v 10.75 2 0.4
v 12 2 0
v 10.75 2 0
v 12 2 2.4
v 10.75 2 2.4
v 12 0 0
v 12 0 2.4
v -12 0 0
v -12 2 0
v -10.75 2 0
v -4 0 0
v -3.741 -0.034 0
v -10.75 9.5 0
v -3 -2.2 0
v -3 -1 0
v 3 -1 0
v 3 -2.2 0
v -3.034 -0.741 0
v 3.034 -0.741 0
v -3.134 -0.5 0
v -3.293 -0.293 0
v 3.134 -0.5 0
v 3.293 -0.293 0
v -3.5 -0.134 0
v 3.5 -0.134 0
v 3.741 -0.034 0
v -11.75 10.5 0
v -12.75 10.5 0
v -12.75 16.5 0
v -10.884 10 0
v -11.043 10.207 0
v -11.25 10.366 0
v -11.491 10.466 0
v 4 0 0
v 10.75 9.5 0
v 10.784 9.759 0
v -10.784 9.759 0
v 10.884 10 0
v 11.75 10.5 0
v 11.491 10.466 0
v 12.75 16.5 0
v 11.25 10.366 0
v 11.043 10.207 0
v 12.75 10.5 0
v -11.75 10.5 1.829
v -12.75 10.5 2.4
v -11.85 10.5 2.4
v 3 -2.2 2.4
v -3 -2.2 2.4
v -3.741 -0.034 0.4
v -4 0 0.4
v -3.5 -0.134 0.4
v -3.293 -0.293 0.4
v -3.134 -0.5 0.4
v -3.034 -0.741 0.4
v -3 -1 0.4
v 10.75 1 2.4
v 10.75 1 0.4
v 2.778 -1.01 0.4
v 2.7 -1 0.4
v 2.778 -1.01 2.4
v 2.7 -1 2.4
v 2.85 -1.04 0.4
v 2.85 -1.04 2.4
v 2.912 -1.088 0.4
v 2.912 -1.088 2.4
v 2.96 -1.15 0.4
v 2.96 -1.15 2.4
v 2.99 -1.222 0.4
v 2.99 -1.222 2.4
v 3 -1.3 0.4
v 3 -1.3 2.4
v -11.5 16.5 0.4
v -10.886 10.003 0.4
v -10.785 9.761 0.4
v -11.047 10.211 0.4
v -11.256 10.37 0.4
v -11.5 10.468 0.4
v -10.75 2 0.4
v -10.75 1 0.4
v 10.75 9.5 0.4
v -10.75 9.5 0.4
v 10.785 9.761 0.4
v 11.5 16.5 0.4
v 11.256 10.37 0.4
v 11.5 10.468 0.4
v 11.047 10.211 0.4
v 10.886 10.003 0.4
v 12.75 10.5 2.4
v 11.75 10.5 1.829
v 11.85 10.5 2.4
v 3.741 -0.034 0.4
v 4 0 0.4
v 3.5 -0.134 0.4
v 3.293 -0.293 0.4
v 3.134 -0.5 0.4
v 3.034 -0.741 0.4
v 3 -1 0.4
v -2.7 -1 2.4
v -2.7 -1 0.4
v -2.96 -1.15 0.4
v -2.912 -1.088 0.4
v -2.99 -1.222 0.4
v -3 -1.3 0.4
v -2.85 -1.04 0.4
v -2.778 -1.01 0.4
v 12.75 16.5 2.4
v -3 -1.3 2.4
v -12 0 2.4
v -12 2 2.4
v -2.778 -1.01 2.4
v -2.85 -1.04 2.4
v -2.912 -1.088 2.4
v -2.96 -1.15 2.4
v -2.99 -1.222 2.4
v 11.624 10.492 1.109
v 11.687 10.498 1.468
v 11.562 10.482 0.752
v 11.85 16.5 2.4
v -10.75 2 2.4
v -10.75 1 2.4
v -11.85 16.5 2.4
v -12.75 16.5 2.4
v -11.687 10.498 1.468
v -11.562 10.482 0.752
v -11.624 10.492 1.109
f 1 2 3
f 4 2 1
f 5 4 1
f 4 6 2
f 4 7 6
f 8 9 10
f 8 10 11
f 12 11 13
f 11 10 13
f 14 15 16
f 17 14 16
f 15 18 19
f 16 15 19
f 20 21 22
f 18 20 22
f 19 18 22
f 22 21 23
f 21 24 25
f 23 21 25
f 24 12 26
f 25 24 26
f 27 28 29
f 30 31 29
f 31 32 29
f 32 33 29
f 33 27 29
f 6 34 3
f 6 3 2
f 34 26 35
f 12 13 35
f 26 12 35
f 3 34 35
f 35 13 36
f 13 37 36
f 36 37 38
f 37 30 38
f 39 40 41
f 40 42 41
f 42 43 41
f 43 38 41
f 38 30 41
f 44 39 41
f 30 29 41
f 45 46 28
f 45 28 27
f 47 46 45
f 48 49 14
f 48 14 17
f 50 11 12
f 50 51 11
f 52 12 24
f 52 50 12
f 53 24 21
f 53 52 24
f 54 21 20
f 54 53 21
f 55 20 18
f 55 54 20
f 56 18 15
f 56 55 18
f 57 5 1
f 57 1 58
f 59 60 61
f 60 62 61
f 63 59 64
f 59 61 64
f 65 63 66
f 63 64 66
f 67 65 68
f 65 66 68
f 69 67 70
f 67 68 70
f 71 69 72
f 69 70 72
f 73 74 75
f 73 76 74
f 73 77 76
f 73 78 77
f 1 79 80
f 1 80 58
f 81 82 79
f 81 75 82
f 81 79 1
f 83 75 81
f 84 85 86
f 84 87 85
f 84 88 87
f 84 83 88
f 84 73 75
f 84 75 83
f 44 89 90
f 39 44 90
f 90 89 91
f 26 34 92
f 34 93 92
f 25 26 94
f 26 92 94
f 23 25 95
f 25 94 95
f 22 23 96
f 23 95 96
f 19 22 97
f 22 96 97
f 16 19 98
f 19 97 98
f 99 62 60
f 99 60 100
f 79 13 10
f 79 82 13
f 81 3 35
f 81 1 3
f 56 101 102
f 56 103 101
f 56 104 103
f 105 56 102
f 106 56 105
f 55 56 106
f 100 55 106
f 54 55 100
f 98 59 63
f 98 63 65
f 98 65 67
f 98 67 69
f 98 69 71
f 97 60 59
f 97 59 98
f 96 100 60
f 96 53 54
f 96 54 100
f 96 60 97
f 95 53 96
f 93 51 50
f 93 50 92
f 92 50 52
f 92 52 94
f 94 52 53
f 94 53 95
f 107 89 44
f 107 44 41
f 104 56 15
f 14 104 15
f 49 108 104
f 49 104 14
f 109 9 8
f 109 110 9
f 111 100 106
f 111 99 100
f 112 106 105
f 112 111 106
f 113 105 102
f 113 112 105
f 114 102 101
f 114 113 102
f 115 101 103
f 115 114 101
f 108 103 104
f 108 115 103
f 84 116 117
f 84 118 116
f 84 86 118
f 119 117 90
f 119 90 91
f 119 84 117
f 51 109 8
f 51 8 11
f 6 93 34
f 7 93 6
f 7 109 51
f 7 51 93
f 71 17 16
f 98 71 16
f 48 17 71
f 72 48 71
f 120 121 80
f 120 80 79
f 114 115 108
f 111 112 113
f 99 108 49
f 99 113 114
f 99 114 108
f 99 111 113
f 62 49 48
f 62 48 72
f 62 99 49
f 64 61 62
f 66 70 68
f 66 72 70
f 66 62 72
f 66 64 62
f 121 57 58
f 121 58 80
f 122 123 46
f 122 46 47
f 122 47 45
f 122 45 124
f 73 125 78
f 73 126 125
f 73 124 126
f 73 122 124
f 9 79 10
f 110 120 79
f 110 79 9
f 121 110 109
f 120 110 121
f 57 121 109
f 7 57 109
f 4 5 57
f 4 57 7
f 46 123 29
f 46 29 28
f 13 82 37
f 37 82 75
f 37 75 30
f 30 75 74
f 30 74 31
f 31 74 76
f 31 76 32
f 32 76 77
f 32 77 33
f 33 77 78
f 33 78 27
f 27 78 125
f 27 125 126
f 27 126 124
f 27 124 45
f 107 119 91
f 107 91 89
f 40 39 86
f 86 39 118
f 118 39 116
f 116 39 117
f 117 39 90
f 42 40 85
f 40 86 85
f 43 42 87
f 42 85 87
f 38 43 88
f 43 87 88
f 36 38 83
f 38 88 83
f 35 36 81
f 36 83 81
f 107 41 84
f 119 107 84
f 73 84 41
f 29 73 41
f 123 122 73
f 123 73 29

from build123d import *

# Parameters (mm, degrees)
F0_W     = 6
F0_H     = 1
F0_H_2   = 1.2
F0_W_2   = 1.1
F0_H_3   = 6
F0_W_3   = 0.9
F5_DEPTH = 6
F6_R     = 1
F7_R     = 0.3


with BuildPart() as f2:
    # F2: sweep along a path in F1
    with BuildLine(Plane.XZ) as f2_path:
        Line((0, 0), (0, 0.4))
    # F0 (on Top) → F2 (sweep)
    with BuildSketch(Plane.XY):
        Polygon((-10.75, 1), (-10.75, 0), (-3, 0), (3, 0), (10.75, 0), (10.75, 1), align=None)
        Polygon((-12, 0), (-10.75, 0), (-10.75, 1), (-10.75, 2), (-12, 2), align=None)
        with Locations((0, -0.5)):
            Rectangle(F0_W, F0_H)
        Polygon((-10.75, 2), (-10.75, 1), (10.75, 1), (10.75, 2), (10.75, 10.5), (10.75, 16.5), (-10.75, 16.5), (-10.75, 10.5), align=None)
        with Locations((0, -1.6)):
            Rectangle(F0_W, F0_H_2)
        Polygon((10.75, 2), (10.75, 1), (10.75, 0), (12, 0), (12, 2), align=None)
        with Locations((-11.3, 13.5)):
            Rectangle(F0_W_2, F0_H_3)
        with Locations((-12.3, 13.5)):
            Rectangle(F0_W_3, F0_H_3)
        with Locations((11.3, 13.5)):
            Rectangle(F0_W_2, F0_H_3)
        with Locations((12.3, 13.5)):
            Rectangle(F0_W_3, F0_H_3)
    sweep(path=f2_path.line)

    # F3: sweep along a path in F1
    with BuildLine(Plane.XZ) as f3_path:
        Line((0, 0), (0, 0.4))
        Line((0, 0.4), (0, 2.4))
    # F0 (on Top) → F3 (sweep)
    with BuildSketch(Plane.XY):
        Polygon((-10.75, 1), (-10.75, 0), (-3, 0), (3, 0), (10.75, 0), (10.75, 1), align=None)
        Polygon((-12, 0), (-10.75, 0), (-10.75, 1), (-10.75, 2), (-12, 2), align=None)
        Polygon((10.75, 2), (10.75, 1), (10.75, 0), (12, 0), (12, 2), align=None)
        with Locations((12.3, 13.5)):
            Rectangle(F0_W_3, F0_H_3)
        with Locations((-12.3, 13.5)):
            Rectangle(F0_W_3, F0_H_3)
        with Locations((0, -1.6)):
            Rectangle(F0_W, F0_H_2)
    sweep(path=f3_path.line)

    # F4 (on face) → F5 (join, through all)
    with BuildSketch(Plane(origin=(0, 16.5, 0), x_dir=(-1, 0, 0), z_dir=(0, 1, 0))):
        Polygon((-11.5, 0.4), (-11.85, 2.4), (-11.85, 0.4), align=None)
        Polygon((11.85, 2.4), (11.5, 0.4), (11.85, 0.4), align=None)
    extrude(amount=-F5_DEPTH)

    # F6
    f6_edges = [f2.edges().sort_by_distance(p)[0] for p in [
        (-10.75, 10.5, 0.2),
        (10.75, 10.5, 0.2),
        (3, 0, 0.2),
        (-3, 0, 0.2),
    ]]
    fillet(f6_edges, radius=F6_R)

    # F7
    f7_edges = [f2.edges().sort_by_distance(p)[0] for p in [
        (-3, -1, 1.4),
        (3, -1, 1.4),
    ]]
    fillet(f7_edges, radius=F7_R)


solid = f2.part
